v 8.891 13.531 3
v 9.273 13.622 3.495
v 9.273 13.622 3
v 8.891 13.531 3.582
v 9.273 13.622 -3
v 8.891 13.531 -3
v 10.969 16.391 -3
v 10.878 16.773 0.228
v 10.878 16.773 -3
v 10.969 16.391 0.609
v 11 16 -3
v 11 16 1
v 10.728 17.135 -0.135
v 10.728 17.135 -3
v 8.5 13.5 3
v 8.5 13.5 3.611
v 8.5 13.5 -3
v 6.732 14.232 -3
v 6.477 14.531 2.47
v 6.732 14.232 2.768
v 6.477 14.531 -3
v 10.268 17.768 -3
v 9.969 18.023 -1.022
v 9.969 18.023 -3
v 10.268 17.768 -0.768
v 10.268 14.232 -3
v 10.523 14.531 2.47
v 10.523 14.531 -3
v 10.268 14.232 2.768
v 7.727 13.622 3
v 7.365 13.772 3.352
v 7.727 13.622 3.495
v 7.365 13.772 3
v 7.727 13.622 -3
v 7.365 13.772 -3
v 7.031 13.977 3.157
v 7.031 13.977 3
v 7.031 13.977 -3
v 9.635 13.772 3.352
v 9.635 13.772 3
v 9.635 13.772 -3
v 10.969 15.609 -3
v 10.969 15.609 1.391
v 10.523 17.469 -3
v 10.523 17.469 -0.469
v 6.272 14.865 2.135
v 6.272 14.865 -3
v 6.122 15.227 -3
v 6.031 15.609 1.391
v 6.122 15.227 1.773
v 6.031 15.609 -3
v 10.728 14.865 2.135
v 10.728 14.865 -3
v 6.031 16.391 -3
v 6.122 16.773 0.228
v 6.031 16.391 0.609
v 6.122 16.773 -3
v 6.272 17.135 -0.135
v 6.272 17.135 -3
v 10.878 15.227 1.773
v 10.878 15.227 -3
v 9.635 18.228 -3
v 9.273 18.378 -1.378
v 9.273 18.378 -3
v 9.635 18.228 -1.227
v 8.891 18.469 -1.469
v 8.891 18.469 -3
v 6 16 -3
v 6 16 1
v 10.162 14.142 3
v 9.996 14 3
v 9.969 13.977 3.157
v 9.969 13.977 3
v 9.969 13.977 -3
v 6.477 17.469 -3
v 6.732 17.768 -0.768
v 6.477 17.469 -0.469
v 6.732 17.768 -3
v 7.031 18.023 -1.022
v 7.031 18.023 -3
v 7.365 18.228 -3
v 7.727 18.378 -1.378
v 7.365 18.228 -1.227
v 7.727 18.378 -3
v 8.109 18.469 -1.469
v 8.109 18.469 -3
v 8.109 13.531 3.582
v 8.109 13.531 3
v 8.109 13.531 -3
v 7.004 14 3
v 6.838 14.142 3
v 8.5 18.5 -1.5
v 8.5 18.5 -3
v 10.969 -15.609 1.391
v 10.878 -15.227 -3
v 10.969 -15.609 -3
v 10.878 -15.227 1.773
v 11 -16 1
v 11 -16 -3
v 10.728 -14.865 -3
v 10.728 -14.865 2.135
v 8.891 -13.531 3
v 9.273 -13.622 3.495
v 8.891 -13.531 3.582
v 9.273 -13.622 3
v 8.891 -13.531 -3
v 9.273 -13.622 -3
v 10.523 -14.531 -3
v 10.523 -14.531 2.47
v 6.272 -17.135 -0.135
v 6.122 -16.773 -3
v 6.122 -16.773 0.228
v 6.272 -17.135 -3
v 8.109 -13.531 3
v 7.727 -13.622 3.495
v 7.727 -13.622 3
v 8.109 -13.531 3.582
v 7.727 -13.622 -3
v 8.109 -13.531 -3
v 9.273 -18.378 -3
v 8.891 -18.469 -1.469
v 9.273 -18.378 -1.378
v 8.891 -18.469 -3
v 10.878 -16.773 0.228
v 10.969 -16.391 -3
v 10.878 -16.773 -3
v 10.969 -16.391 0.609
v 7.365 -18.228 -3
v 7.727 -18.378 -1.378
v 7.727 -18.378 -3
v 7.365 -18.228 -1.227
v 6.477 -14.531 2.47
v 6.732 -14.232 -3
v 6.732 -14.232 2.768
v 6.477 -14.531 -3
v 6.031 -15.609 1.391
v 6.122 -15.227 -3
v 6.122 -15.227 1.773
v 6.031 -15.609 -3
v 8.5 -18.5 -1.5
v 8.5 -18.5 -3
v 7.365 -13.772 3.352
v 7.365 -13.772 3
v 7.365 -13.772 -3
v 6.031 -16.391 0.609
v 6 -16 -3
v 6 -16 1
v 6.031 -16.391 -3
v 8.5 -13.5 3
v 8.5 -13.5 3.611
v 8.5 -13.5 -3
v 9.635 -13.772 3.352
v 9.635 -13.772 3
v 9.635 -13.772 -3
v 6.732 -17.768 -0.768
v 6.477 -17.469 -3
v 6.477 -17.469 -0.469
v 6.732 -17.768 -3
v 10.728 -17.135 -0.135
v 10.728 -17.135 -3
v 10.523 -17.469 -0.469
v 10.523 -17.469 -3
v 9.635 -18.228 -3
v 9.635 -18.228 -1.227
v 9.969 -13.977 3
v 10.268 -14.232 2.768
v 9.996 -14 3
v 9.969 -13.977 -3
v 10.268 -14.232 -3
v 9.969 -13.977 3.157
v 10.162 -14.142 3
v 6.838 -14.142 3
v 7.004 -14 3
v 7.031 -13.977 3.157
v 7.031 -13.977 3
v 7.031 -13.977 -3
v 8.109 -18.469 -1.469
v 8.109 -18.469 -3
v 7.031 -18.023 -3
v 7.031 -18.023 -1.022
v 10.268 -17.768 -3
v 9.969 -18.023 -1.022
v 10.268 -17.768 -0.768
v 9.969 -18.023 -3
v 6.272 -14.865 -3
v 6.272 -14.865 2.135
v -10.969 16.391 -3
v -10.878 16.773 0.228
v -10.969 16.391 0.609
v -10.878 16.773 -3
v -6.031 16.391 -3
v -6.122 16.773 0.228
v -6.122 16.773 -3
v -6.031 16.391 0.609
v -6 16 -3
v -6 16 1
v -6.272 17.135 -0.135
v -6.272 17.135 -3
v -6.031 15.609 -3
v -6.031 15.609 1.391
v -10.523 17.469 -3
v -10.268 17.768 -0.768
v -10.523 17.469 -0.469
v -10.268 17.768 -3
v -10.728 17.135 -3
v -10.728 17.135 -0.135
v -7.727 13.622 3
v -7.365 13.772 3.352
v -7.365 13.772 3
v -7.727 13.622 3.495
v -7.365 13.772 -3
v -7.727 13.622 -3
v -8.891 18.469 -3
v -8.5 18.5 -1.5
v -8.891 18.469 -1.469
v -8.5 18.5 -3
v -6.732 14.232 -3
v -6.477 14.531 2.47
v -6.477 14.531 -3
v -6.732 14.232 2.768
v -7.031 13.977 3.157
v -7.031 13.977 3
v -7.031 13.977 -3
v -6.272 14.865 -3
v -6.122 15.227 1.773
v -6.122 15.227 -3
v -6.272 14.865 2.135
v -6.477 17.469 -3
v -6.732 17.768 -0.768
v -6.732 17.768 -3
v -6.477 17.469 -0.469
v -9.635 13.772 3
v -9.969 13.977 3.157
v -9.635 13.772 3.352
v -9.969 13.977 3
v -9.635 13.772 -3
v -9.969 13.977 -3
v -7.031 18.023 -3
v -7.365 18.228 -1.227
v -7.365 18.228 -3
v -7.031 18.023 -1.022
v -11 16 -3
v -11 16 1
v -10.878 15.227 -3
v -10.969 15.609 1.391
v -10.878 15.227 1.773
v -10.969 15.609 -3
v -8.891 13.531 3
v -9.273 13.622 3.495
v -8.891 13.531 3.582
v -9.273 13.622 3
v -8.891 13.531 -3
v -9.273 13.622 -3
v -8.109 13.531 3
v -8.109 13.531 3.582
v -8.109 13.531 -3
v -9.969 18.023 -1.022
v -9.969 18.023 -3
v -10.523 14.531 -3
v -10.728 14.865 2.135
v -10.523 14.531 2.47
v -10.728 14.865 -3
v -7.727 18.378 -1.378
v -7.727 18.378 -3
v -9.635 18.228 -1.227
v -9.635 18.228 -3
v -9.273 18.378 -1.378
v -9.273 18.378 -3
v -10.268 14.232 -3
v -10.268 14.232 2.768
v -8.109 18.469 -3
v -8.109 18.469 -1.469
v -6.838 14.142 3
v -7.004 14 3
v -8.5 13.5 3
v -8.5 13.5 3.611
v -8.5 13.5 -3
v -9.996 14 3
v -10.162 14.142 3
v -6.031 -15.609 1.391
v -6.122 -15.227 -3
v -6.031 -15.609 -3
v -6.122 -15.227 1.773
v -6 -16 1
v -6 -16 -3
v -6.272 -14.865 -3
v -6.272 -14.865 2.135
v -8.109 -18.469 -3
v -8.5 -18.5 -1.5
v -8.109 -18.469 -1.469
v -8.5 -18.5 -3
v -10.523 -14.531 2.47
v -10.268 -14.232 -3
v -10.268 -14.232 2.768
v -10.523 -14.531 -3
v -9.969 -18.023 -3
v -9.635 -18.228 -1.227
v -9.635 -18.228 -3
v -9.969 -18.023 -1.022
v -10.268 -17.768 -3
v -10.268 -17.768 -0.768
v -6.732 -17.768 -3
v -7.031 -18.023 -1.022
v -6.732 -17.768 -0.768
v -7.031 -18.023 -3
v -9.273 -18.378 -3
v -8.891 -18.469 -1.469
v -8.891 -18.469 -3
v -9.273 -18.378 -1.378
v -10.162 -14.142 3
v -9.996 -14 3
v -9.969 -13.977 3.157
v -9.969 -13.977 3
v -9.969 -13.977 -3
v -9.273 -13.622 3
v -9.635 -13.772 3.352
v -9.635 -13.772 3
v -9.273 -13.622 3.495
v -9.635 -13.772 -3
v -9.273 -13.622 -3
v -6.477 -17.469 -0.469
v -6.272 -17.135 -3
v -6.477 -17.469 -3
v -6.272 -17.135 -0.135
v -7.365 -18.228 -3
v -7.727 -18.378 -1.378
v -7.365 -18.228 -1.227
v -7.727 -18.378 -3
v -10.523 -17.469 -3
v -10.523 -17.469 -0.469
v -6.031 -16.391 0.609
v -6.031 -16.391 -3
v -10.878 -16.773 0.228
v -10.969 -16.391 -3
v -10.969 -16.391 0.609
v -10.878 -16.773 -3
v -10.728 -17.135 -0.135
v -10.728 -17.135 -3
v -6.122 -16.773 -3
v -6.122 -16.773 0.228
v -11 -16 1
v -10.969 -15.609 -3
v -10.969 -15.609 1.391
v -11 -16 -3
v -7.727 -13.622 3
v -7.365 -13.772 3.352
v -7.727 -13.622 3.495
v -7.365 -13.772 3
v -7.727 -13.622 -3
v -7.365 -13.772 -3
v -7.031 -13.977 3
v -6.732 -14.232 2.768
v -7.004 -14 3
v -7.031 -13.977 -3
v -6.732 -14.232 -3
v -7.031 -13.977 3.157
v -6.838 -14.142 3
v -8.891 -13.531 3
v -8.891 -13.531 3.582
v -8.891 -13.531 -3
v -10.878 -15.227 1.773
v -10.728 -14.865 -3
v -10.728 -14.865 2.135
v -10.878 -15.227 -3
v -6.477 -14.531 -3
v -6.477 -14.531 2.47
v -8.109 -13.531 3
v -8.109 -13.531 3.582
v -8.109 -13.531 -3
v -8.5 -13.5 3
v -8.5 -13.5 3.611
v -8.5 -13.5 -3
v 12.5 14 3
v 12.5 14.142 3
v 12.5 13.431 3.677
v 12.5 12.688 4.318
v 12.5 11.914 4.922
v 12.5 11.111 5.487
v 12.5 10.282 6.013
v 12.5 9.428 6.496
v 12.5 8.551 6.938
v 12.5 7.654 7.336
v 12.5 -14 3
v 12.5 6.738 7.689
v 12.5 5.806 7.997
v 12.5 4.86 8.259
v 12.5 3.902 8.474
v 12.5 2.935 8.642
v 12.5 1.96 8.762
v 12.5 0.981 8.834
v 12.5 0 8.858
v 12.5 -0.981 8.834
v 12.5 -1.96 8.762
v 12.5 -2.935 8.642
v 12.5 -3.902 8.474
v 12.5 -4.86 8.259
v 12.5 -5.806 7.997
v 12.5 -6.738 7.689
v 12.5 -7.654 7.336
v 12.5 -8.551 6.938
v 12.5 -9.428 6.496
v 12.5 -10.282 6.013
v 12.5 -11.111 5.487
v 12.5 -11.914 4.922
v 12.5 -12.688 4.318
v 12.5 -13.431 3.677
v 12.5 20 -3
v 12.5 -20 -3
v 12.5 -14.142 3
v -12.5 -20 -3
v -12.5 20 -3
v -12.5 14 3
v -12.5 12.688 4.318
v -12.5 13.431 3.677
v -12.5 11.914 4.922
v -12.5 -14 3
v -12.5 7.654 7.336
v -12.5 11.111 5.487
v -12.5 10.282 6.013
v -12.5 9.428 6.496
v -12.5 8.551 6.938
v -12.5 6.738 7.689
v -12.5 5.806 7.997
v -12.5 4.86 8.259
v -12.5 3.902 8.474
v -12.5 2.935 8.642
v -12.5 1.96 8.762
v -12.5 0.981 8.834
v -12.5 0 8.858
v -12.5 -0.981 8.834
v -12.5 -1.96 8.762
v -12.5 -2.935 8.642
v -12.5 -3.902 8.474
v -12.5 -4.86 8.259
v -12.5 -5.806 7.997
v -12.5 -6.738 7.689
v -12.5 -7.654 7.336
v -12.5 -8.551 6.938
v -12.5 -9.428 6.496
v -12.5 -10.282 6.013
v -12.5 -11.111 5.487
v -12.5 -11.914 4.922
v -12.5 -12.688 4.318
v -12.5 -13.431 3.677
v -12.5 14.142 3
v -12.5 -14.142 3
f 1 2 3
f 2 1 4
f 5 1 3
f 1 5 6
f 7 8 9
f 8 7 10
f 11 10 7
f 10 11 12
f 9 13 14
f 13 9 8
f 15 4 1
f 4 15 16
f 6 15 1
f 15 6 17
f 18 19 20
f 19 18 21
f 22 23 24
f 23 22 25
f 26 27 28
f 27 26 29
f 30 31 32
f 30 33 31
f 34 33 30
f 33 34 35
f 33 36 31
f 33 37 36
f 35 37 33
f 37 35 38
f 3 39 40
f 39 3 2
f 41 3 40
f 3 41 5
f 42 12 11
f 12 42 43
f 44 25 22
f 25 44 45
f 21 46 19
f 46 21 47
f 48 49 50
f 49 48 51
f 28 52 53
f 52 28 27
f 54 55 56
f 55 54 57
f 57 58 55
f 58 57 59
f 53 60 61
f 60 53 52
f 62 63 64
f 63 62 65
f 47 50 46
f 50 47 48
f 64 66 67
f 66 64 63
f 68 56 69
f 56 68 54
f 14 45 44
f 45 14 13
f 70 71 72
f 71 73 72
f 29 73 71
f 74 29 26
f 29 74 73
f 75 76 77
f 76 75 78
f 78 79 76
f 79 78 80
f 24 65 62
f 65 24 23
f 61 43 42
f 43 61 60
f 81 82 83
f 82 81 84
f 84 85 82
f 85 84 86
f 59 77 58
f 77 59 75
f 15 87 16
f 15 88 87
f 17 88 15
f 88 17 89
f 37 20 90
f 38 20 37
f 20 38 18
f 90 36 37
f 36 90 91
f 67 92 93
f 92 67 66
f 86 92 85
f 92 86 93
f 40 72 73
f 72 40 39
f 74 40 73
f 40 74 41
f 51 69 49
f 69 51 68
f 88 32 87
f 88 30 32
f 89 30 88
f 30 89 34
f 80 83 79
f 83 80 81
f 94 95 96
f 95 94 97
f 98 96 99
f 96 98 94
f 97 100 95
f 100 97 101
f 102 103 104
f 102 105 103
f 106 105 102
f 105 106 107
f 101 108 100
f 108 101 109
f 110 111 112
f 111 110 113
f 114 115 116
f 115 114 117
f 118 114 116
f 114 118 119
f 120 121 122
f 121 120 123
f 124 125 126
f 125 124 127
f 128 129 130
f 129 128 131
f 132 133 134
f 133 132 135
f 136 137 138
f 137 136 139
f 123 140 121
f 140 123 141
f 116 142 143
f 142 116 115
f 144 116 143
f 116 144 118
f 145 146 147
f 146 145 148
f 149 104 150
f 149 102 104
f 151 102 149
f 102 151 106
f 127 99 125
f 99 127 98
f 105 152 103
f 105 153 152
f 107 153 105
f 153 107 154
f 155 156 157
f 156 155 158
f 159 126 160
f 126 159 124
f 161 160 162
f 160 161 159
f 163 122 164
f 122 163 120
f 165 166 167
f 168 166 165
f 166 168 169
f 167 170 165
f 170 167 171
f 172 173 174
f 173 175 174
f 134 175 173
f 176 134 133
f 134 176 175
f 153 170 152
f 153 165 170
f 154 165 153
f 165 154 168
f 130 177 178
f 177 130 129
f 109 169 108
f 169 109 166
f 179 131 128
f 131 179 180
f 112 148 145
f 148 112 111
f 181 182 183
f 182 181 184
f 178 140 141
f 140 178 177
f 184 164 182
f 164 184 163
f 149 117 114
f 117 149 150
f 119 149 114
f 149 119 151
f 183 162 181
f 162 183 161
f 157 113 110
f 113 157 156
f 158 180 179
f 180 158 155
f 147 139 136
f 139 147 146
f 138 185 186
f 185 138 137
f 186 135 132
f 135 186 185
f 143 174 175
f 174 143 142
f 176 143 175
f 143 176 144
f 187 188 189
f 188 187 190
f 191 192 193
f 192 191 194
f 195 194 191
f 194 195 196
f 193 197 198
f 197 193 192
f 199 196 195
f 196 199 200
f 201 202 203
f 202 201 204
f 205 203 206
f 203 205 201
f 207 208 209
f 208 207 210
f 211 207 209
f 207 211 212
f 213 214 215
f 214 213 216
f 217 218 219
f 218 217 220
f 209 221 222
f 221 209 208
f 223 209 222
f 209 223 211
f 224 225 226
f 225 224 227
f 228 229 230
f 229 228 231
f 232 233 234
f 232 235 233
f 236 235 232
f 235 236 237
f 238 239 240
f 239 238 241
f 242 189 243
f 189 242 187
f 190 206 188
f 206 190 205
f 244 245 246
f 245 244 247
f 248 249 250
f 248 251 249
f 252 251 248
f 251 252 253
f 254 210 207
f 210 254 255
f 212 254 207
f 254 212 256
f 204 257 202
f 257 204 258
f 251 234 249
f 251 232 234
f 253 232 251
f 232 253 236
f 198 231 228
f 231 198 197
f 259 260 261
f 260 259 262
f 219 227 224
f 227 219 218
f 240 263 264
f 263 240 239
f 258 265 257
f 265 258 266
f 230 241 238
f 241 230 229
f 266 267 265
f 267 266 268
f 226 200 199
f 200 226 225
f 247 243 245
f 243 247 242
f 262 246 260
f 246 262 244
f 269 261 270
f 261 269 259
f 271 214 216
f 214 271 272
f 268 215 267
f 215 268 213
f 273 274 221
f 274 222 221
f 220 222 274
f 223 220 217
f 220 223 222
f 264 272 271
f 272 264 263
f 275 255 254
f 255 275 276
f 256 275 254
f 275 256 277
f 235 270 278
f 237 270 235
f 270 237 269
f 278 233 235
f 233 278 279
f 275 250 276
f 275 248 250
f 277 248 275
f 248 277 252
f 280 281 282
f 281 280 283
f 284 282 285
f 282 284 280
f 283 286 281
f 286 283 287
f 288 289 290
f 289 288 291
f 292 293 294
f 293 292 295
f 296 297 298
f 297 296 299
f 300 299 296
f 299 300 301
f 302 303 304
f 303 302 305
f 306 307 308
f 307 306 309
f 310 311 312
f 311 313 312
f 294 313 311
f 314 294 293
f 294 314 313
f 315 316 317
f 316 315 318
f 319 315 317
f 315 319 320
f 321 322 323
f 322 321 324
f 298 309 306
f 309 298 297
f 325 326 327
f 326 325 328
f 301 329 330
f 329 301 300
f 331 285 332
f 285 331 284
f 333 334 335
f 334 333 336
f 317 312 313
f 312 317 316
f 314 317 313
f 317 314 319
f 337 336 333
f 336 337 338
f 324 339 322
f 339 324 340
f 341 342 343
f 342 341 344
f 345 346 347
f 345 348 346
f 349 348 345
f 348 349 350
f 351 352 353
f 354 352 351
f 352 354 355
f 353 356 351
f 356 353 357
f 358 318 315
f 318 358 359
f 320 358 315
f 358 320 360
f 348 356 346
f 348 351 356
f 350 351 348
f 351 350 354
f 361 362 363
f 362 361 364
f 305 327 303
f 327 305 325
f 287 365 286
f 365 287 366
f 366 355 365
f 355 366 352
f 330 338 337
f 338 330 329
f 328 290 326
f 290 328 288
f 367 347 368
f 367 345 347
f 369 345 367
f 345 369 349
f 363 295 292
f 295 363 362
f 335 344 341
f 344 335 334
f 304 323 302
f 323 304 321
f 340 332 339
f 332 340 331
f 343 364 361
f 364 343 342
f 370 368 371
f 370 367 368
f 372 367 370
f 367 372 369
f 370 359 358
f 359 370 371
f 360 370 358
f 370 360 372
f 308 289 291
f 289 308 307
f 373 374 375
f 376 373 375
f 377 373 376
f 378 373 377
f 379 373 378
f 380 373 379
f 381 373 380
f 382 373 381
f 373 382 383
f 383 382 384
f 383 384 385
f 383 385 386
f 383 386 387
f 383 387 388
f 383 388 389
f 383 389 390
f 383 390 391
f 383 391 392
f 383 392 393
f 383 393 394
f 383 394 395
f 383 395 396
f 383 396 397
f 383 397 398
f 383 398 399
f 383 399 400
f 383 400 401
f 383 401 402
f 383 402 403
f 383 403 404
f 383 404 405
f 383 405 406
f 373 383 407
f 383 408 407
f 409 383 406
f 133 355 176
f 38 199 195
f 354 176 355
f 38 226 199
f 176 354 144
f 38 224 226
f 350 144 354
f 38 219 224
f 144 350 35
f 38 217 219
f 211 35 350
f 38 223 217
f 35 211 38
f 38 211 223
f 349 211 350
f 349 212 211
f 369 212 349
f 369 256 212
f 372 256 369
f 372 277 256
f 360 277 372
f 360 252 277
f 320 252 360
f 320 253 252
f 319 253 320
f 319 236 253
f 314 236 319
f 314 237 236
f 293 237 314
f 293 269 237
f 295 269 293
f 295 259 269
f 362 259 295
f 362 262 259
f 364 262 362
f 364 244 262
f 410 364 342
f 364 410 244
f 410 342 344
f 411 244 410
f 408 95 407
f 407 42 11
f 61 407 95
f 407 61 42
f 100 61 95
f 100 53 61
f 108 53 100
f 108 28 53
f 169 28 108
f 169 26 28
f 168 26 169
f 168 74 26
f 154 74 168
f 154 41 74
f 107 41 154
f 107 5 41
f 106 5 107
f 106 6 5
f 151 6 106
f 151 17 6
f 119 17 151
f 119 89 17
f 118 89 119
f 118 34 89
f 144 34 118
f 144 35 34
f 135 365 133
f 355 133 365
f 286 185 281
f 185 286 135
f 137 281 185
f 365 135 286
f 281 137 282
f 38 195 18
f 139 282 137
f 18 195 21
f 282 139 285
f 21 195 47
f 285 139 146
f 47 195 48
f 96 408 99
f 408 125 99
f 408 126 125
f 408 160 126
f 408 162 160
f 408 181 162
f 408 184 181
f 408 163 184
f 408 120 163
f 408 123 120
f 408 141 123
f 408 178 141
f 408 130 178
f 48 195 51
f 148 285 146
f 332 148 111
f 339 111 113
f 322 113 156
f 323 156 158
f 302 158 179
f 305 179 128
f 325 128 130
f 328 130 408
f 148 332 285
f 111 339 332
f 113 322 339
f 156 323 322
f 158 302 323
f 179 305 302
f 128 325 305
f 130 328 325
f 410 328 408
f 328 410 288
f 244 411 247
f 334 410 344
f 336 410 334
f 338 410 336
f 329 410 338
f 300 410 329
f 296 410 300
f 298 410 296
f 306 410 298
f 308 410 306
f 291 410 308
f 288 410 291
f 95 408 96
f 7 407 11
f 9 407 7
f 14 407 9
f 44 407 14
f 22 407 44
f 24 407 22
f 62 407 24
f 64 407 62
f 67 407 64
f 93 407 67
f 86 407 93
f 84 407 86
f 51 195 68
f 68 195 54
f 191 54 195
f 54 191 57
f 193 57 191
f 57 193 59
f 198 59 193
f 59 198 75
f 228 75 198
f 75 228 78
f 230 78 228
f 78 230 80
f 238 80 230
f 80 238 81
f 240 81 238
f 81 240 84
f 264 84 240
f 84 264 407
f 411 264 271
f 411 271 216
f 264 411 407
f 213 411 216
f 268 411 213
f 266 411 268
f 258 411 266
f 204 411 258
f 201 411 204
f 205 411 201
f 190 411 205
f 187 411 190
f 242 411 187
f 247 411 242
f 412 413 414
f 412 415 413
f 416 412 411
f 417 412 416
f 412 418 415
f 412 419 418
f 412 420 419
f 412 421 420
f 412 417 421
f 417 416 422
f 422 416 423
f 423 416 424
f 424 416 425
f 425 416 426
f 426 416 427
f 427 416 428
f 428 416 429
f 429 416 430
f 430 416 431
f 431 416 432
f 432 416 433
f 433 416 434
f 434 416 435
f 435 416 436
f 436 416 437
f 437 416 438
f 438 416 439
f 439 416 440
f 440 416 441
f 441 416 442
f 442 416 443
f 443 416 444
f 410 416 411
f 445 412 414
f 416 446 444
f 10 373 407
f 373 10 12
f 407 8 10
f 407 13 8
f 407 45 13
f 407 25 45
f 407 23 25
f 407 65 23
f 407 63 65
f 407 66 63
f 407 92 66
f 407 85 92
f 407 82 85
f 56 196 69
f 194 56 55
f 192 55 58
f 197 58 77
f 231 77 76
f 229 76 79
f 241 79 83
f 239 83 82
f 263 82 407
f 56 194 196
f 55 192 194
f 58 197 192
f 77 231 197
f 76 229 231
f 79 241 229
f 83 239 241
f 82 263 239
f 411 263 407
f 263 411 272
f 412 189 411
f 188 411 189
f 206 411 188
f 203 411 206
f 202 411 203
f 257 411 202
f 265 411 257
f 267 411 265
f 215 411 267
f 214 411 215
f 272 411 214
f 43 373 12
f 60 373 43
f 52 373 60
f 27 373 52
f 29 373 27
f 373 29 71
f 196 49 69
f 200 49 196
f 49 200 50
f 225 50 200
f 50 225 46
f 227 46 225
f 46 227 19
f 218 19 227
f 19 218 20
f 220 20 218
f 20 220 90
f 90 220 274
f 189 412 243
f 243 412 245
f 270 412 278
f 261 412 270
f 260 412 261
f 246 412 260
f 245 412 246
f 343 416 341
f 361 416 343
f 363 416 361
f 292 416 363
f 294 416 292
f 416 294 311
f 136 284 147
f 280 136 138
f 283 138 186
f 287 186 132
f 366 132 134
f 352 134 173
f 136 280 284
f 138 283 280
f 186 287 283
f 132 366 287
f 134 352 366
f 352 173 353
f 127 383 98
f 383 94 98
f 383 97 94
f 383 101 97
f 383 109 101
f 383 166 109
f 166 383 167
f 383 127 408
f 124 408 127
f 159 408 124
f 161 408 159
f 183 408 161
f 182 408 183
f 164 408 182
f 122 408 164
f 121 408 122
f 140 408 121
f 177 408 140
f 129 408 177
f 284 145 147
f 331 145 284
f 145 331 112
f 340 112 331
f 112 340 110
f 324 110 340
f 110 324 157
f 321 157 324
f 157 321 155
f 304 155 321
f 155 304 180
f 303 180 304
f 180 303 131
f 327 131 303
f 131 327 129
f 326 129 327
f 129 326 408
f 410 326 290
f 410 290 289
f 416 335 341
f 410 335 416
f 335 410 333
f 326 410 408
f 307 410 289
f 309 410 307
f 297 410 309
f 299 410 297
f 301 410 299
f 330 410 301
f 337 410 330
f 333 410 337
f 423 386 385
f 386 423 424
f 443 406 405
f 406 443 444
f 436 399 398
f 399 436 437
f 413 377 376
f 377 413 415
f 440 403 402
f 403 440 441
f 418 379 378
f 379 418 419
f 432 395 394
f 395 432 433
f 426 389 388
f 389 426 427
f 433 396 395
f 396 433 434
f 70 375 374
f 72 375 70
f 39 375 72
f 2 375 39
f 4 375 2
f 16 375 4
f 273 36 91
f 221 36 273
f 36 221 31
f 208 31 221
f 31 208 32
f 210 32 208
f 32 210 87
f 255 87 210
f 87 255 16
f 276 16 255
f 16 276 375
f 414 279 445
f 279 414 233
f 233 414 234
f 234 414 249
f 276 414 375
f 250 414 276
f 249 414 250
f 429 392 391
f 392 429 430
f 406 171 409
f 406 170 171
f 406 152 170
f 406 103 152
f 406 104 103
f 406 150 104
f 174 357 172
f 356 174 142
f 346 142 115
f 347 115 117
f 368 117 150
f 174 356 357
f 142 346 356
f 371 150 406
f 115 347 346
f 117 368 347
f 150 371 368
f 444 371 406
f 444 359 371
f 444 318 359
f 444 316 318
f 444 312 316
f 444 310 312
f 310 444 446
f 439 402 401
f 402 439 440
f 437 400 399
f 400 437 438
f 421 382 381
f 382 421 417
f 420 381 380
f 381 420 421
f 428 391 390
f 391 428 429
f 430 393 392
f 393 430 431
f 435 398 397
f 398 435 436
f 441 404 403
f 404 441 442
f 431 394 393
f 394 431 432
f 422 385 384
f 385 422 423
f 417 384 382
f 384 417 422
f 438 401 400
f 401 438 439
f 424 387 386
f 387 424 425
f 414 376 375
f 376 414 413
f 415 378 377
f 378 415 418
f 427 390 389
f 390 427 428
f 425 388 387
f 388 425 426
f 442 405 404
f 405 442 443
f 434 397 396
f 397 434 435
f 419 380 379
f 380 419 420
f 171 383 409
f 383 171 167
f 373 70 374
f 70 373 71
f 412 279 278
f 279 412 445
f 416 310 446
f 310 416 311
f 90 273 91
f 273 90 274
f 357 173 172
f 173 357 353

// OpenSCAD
// file: microGearMotorMount.scad
//===============================
//
//  No-tools micro motor mounts
//
//  Designed by Andrew Moore, May 2016
//      http://www.thingiverse.com/TacPar
//
//      For questions, suggestions, or whatever, 
//      please PM me through thingiverse.
//
//      This work is licensed under a Creative Commons 
//      Attribution-ShareAlike 4.0 International License.
//      http://creativecommons.org/licenses/by-sa/4.0/
//
//  This can be used with a variety of 12mm micro gear motors
//  Length dimensions may need to change to accomodate 
//  different gear ratios (particularly the Pololu 
//  1000:1 motors)
//
//  This design allows for a little slop in motor 
//  position.  You can always tighten that up with 
//  some shim stock after you insert the motor.
//
//  The mounting holes are arbitrarily set based on the plate dimensions
//  This could be improved.
//
//  If you use an encoder, you may have to solder it to the back of the 
//  motor after inserting the motor into the holder.
//===============================



//this is motor length without the gearbox
motor_length = 15;
//dimension for rounded sides on micro motor
motor_width = 12; 	
//flat sides on micro motor
motor_height = 10;
//length of the gear box not including the output shaft
gearbox_length = 10;

//wall thickness for the motor holder before tolerance losses
housing_thickness = 3;

//this defines how oversized the hole is for the motor
//this will reduce the effective housing thickness above
tolerance = 0.25;

plate_width = 40;

plate_length = motor_length+gearbox_length;

module MicroGearMotorMount(
  plate_thickness = 3
)
{
	//backplate()
	difference()
	{
		positives();
		negatives();
	}
	//add ons in areas that were erased...
	
	//back plate
	translate([plate_length/2-motor_length/2,0,-(motor_height/2+plate_thickness/2)]) BackPlate(plate_thickness);

	module positives()
	{
		//motor holding ring
		rotate([0,90,0]) 
            translate([0,0,0]) 
            cylinder(r=motor_width/2+housing_thickness, h=motor_length, center=true, $fn=40);

		translate([0,0,-motor_height/2+plate_thickness]) 
            cube([motor_length,motor_width+2*housing_thickness,motor_height-plate_thickness], center=true);

	}

	module negatives()
	{
		//cut off cylinder below the mounting plate
		translate([0,0,-(motor_height/2+plate_thickness-0.01)]) 
            cube([100,100,2*plate_thickness], center=true);

		//keyed shaft
		rotate([0,90,0]) 
        translate([0,0,-motor_length/2-0.1]) keyshaft(); 
        //translate([0,0,-motor_height/4]) cube([motor_length+.1,motor_width+1,motor_height/2], center=true);
		
	}
    module keyshaft()
    {
        difference()
		{
			positives();
            negatives();
            
			
		}
        module positives()
        {
            cylinder(r=motor_width/2+tolerance, h=motor_length+1, $fn=50);
        }
        
        module negatives()
        {
            translate([-motor_height-tolerance,0,motor_length/2+tolerance]) cube([motor_height,motor_width,motor_length+2],center=true);
            translate([motor_height+tolerance,0,motor_length/2+tolerance]) cube([motor_height,motor_width,motor_length+2],center=true);
        }
    }
  }


module BackPlate(plate_thickness=3,tab=true,screw_radius=1.75)
	{
      tongue_thickness=2;
      tab_height = tongue_thickness+2;
      tab_width = 5;
      tab_thickness = 1.5;

      difference()
      {
        positives();
        negatives();
      }
        
      module positives()
      {
          cube([plate_length,plate_width,plate_thickness],center=true);
      }
      module negatives()
      {
          mount_holes();
        if (tab) {tab_slots();}
      }
        
      module mount_holes()
      {
        rotate([0,0,0]) 
                  translate([plate_length/2-4,plate_width/2-4,0]) 
                  cylinder(r=screw_radius, h=plate_thickness+1, $fn=40, center=true);
        rotate([0,0,0])
                  translate([plate_length/2-4,-(plate_width/2-4),0]) 
                  cylinder(r=screw_radius, h=plate_thickness+1, $fn=40, center=true);
        rotate([0,0,0])
                  translate([-(plate_length/2-4),plate_width/2-4,0]) 
                  cylinder(r=screw_radius, h=plate_thickness+1, $fn=40, center=true);
        rotate([0,0,0])
                  translate([-(plate_length/2-4),-(plate_width/2-4),0]) 
                  cylinder(r=screw_radius, h=plate_thickness+1, $fn=40, center=true);
        
      }
      
      module tab_slots()
      {
        translate([0.4*plate_length,tab_width/2, 0]) cube([plate_length,1,plate_thickness+1], center=true);
        translate([0.4*plate_length,-tab_width/2, 0]) cube([plate_length,1,plate_thickness+1], center=true);
        
        // If the tongue needs to be thinner
        translate([0.4*plate_length,0, -tongue_thickness]) cube([plate_length,tab_width,plate_thickness], center=true);
      }
	

	   //gearbox tab ... stops motor from sliding forward
      if (tab)
      {
        translate([plate_length/2+tab_thickness/2,0,plate_thickness/2]) cube([tab_thickness,tab_width-1,tab_height], center=true);
        
        //Print a very thin support that will break, so tab can be printed in upright rotation
        support_thickness=0.1;
        translate([plate_length/2,(tab_width-1)/2,plate_thickness/2])rotate([0,0,180])prism(support_thickness,tab_height-tongue_thickness,tab_height-tongue_thickness);
        translate([plate_length/2,-(tab_width-1)/2+support_thickness,plate_thickness/2])rotate([0,0,180])prism(support_thickness,tab_height-tongue_thickness,tab_height-tongue_thickness);
      }
}

//Draw a prism based on a 
//right angled triangle
//l - length of prism
//w - width of triangle
//h - height of triangle
//From https://github.com/orionrobots/openscad_parts_library/blob/master/prism.scad
module prism(l, w, h) {
       polyhedron(points=[
               [0,0,h],           // 0    front top corner
               [0,0,0],[w,0,0],   // 1, 2 front left & right bottom corners
               [0,l,h],           // 3    back top corner
               [0,l,0],[w,l,0]    // 4, 5 back left & right bottom corners
       ], faces=[ // points for all faces must be ordered clockwise when looking in
               [0,2,1],    // top face
               [3,4,5],    // base face
               [0,1,4,3],  // h face
               [1,2,5,4],  // w face
               [0,3,5,2],  // hypotenuse face
       ]);
}

MicroGearMotorMount();
// main file
use <microGearMotorMount.scad>


//this is motor length without the gearbox
motor_length = 15;
//dimension for rounded sides on micro motor
motor_width = 12; 	
//flat sides on micro motor
motor_height = 10;
//length of the gear box not including the output shaft
gearbox_length = 10;

//wall thickness for the motor holder before tolerance losses
housing_thickness = 3;

//this defines how oversized the hole is for the motor
//this will reduce the effective housing thickness above
tolerance = 0.25;

plate_width = 40;

plate_length = motor_length+gearbox_length;

plate_thickness=6;
screw_radius=2.5;
corner_radius=20;

sqr2=1.4142;

rotate([0,0,0])
difference() {
  BackPlate(plate_thickness=plate_thickness, tab=false, screw_radius=screw_radius);
  translate([0,plate_width/2,+plate_thickness/2])
  rotate([45,0,0])cube([plate_width,plate_thickness*sqr2,plate_thickness*sqr2],center=true);
  translate([0,-plate_width/2,+plate_thickness/2])
  rotate([45,0,0])cube([plate_width,plate_thickness*sqr2,plate_thickness*sqr2],center=true);
}
cube_side = plate_width/sqr2;
difference() {
Corner(plate_length,plate_width,corner_radius,plate_thickness);
translate([0,0,plate_thickness])rotate([0,0,0])mount_holes();
}
module Corner(length,width,corner_radius, plate_thickness)
{
translate([0,0,-(corner_radius*sqr2/2)+plate_thickness/2])
rotate([0,90,0])
{
difference () {
  cylinder(r=corner_radius,h=length, center=true, $fn=128);
  translate([corner_radius-(corner_radius*sqr2/2),0,0])cube([2*corner_radius,2*corner_radius,length],center=true);
}
}
}

      module mount_holes()
      {
        rotate([0,0,0]) 
                  translate([plate_length/2-4,plate_width/2-4,0]) 
                  cylinder(r=screw_radius, h=plate_thickness+1, $fn=40, center=true);
        rotate([0,0,0])
                  translate([plate_length/2-4,-(plate_width/2-4),0]) 
                  cylinder(r=screw_radius, h=plate_thickness+1, $fn=40, center=true);
        rotate([0,0,0])
                  translate([-(plate_length/2-4),plate_width/2-4,0]) 
                  cylinder(r=screw_radius, h=plate_thickness+1, $fn=40, center=true);
        rotate([0,0,0])
                  translate([-(plate_length/2-4),-(plate_width/2-4),0]) 
                  cylinder(r=screw_radius, h=plate_thickness+1, $fn=40, center=true);
        
      }
